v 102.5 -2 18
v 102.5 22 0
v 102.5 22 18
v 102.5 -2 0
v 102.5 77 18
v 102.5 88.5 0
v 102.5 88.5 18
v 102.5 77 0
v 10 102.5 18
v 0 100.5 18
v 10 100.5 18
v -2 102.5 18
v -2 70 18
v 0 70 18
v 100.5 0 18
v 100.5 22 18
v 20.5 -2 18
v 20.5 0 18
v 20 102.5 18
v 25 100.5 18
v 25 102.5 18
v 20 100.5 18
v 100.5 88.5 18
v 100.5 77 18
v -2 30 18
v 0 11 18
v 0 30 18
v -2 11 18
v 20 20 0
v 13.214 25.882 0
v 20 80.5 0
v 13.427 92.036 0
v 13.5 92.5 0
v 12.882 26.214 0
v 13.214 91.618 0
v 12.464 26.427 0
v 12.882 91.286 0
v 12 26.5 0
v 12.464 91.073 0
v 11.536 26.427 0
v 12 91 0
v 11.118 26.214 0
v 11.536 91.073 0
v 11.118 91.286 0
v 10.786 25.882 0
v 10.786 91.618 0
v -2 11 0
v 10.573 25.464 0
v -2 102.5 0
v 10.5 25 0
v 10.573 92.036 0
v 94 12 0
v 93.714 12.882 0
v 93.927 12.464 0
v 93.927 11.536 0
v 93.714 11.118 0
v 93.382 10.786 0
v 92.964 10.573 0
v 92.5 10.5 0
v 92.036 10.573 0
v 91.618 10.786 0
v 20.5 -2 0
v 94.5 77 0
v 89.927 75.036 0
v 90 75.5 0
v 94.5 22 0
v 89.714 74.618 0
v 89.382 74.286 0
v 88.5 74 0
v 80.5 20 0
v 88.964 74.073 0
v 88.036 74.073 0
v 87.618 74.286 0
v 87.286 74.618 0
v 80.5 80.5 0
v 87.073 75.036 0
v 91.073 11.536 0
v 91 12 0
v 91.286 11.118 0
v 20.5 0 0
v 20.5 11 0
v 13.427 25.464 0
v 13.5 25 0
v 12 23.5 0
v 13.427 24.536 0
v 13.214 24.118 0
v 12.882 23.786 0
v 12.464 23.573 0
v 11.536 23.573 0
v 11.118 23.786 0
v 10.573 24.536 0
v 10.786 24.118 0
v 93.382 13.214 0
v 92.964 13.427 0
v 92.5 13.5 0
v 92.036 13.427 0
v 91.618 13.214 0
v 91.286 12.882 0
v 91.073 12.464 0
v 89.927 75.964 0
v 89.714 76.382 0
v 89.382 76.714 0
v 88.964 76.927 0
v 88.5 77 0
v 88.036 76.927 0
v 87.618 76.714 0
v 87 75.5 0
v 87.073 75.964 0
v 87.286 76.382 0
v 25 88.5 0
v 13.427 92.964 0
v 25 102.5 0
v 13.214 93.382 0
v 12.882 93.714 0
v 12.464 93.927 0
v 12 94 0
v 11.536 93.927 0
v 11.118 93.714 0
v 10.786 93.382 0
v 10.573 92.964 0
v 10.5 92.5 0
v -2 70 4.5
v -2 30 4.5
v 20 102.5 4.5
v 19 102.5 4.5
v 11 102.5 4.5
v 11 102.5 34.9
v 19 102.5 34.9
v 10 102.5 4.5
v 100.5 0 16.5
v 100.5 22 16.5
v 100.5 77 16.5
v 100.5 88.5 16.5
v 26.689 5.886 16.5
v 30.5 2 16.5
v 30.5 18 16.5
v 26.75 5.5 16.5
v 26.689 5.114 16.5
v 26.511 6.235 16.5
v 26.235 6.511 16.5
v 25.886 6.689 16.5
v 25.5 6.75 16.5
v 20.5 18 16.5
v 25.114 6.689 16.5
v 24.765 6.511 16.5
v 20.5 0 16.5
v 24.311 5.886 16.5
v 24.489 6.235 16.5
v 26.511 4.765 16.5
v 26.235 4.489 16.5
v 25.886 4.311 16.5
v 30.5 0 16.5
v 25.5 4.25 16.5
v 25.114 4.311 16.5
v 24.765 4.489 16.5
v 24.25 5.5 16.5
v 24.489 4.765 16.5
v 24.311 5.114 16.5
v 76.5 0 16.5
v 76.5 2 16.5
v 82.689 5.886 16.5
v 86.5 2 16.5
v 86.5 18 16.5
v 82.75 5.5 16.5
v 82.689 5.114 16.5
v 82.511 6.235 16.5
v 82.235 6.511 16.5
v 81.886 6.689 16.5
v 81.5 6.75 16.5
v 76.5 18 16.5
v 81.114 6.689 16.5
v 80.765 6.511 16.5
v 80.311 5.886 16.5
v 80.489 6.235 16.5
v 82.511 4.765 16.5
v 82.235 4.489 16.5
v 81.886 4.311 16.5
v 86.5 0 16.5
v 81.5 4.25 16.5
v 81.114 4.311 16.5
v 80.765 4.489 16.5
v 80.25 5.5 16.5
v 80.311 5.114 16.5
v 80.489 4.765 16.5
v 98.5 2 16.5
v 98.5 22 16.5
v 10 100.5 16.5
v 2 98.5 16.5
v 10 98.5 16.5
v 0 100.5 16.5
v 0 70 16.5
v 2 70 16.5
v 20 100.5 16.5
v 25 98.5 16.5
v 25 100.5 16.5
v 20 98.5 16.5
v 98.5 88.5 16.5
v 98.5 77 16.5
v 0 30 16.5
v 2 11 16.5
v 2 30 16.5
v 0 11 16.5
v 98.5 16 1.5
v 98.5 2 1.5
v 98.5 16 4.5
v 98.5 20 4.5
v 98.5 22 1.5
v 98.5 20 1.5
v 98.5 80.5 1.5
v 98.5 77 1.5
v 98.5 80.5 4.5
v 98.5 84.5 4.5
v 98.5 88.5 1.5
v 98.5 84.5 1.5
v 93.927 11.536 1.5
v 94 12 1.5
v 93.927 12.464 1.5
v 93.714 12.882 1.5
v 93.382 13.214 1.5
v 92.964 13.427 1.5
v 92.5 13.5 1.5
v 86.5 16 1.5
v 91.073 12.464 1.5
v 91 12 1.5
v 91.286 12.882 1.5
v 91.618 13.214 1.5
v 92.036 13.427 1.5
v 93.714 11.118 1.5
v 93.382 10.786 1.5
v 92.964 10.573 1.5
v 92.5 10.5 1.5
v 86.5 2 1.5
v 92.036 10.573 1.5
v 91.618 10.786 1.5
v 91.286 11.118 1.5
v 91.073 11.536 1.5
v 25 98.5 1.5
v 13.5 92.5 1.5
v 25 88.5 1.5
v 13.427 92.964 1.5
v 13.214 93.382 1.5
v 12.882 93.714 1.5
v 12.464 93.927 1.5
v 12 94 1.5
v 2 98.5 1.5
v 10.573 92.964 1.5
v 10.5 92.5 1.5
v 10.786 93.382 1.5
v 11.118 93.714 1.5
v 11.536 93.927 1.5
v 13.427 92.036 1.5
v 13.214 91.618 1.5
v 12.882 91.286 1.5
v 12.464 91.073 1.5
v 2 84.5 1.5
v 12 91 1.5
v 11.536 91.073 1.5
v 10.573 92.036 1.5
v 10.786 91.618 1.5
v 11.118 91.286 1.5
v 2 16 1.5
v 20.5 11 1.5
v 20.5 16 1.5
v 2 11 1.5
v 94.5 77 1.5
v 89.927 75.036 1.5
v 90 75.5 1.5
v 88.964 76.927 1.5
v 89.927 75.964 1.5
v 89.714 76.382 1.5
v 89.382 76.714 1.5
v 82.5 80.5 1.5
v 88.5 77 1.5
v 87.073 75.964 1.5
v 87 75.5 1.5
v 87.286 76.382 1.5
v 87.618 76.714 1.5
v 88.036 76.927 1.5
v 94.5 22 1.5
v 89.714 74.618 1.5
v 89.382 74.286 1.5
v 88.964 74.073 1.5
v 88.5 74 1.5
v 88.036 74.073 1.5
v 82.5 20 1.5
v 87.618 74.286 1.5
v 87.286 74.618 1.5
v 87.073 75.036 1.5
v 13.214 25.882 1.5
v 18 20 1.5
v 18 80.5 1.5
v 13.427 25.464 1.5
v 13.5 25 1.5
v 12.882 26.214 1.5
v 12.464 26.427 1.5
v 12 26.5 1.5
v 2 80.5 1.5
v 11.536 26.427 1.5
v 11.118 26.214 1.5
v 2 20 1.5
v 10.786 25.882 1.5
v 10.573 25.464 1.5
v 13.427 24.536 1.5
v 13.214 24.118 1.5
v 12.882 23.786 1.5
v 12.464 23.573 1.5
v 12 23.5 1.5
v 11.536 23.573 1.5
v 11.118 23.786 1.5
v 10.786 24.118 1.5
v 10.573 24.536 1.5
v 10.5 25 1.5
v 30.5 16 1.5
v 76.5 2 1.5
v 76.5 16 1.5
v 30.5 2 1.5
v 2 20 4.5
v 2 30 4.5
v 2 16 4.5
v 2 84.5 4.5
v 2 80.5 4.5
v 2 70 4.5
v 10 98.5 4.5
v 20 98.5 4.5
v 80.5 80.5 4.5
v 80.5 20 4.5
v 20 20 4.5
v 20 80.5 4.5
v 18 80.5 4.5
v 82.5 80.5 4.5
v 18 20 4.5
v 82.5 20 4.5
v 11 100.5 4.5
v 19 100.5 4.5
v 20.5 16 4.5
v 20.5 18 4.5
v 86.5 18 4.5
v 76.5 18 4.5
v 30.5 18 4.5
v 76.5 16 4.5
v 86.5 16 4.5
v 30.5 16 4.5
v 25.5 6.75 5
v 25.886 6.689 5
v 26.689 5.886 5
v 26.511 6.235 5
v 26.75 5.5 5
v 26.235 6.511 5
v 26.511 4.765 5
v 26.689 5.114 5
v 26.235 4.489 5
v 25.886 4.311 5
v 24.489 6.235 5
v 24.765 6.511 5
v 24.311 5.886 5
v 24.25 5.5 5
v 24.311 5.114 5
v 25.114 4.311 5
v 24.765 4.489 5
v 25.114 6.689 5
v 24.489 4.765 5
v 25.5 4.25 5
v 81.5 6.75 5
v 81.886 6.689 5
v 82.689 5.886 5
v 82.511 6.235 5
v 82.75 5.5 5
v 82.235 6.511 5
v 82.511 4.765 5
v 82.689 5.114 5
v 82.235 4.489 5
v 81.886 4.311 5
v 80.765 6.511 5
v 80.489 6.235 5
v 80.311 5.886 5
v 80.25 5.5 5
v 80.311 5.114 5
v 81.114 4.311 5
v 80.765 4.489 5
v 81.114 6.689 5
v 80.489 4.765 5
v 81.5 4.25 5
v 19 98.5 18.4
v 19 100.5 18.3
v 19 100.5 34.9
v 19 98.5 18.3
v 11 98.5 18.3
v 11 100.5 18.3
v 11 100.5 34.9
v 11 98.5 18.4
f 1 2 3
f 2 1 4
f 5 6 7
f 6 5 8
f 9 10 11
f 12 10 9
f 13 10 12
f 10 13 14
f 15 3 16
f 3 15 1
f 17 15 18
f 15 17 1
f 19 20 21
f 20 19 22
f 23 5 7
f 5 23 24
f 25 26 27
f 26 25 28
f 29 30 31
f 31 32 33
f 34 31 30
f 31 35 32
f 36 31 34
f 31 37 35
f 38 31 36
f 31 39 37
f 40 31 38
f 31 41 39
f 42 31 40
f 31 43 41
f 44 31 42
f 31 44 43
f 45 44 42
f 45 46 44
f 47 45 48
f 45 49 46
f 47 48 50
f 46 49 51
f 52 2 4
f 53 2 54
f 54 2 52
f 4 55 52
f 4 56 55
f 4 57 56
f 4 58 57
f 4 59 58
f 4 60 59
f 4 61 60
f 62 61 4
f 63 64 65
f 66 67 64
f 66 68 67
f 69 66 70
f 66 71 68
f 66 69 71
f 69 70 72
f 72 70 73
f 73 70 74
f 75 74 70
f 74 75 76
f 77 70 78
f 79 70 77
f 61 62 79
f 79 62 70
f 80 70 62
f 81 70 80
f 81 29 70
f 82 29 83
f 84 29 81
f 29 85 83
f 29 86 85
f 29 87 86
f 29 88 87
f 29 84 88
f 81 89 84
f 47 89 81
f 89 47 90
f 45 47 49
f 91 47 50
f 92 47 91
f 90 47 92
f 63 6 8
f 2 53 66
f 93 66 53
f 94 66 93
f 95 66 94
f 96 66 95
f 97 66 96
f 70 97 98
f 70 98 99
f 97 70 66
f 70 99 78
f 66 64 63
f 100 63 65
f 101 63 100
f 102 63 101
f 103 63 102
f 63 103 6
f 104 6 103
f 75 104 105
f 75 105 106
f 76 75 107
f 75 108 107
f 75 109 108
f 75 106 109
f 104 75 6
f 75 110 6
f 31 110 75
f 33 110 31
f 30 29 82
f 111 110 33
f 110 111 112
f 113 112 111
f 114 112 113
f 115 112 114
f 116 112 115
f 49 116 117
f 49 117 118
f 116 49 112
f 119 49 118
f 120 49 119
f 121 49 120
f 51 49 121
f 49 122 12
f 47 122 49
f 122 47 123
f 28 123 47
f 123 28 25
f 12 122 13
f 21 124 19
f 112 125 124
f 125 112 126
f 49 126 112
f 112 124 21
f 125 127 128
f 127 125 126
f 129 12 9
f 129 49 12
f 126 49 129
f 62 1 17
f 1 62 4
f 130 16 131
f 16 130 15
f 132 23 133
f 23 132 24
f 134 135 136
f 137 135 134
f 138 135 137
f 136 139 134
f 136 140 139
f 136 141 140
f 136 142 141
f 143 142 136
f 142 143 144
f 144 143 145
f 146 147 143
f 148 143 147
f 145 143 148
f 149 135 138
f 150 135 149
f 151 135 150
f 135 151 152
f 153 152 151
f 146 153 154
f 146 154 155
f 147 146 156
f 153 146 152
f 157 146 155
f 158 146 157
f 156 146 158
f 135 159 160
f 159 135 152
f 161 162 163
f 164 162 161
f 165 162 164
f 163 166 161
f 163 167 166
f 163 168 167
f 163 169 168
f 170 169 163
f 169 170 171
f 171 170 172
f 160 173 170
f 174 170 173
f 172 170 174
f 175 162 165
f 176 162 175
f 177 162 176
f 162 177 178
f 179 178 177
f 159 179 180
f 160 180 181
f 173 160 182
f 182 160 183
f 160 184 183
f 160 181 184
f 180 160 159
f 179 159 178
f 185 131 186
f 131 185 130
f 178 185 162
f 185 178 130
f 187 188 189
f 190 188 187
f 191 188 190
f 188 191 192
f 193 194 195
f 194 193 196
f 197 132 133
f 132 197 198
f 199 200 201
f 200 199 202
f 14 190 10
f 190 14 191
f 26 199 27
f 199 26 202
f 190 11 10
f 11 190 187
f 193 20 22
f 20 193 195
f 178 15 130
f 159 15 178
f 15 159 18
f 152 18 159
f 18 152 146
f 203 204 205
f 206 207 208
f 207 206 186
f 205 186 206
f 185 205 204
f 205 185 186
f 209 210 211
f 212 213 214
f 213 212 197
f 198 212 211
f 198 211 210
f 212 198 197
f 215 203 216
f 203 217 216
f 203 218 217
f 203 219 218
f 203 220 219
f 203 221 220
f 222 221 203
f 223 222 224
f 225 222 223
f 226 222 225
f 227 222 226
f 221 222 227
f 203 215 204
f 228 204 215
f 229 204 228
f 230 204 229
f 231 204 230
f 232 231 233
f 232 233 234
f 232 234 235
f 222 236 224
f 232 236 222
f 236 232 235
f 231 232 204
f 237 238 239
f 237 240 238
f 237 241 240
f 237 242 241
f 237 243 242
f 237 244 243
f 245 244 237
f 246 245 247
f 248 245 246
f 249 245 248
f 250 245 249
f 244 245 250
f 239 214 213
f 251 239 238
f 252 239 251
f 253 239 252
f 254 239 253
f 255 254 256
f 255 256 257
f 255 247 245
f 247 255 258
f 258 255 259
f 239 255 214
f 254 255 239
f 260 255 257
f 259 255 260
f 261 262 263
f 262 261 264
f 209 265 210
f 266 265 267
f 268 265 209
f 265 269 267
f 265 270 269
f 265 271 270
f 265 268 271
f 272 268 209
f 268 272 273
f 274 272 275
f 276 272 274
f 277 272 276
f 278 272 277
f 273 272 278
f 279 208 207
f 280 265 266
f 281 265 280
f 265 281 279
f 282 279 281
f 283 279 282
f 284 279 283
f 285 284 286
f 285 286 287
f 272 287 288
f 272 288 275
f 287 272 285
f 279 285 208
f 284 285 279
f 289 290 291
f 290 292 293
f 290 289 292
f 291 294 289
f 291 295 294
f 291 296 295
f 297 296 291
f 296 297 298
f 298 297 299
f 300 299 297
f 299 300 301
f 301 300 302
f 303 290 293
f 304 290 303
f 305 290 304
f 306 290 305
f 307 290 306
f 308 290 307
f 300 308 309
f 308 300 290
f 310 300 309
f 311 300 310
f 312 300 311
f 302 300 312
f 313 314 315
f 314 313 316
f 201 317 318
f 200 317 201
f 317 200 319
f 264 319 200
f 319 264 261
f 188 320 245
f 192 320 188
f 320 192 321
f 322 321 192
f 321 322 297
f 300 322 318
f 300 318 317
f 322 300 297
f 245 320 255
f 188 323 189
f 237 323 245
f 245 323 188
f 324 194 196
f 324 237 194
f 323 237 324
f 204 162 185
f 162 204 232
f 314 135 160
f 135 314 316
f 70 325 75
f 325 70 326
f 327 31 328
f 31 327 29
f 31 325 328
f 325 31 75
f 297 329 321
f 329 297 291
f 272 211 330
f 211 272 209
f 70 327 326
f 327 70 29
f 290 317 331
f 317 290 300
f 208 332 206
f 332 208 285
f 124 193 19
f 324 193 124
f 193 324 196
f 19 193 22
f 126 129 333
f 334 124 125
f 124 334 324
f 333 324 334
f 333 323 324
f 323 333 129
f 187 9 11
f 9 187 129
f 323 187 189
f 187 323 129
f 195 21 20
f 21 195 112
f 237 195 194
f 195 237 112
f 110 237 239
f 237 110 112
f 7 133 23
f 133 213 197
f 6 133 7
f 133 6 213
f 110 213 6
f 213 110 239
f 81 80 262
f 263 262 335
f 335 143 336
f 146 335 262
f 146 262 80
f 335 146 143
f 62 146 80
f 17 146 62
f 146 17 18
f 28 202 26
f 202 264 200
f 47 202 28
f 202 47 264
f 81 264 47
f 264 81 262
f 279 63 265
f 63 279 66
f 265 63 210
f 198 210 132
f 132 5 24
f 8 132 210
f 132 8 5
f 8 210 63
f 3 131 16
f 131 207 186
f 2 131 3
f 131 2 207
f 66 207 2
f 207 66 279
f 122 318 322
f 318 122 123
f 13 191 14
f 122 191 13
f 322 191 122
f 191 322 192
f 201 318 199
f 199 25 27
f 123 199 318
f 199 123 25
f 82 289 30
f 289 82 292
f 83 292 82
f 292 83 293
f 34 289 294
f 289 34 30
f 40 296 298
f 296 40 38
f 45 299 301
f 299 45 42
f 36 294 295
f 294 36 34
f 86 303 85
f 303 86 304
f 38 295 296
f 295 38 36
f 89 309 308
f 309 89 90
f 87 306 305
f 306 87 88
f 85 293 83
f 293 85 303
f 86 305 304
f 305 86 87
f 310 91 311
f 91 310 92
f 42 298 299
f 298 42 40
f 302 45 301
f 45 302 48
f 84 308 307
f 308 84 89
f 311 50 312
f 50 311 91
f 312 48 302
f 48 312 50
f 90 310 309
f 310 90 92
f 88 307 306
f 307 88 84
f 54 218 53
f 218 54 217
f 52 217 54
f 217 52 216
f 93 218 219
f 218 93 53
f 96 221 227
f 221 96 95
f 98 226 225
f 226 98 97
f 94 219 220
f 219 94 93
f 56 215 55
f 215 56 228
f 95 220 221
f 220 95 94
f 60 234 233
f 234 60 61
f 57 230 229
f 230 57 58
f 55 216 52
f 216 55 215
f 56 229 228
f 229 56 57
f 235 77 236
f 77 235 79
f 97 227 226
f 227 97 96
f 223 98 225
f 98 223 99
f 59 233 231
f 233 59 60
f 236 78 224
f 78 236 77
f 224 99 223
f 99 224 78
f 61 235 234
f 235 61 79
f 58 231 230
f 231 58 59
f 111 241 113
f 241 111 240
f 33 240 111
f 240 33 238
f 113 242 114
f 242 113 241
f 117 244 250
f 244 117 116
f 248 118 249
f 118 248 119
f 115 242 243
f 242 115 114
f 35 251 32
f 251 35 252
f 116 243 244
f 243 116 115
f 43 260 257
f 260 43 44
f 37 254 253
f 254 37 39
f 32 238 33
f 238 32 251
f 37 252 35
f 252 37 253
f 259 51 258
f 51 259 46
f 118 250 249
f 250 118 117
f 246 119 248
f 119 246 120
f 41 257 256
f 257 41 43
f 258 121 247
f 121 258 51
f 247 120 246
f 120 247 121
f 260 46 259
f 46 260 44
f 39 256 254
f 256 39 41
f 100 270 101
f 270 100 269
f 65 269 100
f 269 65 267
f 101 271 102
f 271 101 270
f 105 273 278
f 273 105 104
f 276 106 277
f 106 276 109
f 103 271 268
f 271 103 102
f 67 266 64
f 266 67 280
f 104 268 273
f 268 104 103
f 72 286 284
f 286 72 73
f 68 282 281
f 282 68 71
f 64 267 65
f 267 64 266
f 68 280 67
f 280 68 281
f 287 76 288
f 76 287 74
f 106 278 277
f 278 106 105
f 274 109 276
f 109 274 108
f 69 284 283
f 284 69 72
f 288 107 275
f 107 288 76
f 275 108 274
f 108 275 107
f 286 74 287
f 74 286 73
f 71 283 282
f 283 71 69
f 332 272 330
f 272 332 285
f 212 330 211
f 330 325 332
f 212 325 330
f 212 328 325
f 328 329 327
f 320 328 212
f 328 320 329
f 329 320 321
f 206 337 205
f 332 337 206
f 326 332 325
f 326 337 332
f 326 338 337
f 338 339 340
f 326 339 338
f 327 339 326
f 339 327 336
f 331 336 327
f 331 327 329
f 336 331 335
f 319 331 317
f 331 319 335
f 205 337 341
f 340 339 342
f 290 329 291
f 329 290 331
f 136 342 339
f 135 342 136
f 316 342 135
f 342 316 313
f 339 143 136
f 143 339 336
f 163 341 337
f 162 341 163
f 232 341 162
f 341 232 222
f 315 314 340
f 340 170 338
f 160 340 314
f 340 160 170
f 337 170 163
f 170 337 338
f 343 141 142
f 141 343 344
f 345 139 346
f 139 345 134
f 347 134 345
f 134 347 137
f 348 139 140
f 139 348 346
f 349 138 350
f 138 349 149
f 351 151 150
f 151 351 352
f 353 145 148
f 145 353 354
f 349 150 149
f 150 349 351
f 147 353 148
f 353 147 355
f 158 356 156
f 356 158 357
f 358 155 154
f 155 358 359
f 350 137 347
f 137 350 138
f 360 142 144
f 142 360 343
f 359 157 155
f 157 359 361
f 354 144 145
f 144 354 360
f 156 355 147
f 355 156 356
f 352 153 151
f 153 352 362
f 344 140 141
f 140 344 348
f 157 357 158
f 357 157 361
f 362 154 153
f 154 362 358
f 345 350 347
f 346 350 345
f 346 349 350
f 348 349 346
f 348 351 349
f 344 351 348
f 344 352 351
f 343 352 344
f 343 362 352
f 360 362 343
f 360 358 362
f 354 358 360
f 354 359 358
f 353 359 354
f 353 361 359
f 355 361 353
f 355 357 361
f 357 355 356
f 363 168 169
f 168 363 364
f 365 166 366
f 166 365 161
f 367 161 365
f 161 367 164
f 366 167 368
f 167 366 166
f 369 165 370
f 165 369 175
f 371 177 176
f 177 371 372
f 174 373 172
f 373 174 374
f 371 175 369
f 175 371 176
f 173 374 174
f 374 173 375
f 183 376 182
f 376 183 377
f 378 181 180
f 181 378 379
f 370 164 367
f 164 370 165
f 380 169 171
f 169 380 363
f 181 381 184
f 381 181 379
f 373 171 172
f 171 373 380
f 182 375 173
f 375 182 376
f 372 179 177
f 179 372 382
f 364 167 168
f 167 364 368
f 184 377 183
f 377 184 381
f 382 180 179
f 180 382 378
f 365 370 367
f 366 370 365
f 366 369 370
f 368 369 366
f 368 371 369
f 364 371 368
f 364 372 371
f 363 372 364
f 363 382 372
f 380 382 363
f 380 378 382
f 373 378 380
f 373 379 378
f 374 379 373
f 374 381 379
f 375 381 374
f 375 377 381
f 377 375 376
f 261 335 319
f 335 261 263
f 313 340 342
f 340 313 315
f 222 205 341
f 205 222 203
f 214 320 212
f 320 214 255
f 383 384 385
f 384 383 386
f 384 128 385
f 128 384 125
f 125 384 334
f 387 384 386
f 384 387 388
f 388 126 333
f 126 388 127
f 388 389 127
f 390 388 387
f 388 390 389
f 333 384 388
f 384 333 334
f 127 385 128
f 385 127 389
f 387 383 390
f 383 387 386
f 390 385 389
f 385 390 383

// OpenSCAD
// Positionnement des trous du pcb
trou_dia=2.5;
trou_dis_g=25;
trou_dis=56;
trou_dis_d=19;
trou_dis_b=5.5;

trou_fixation=3;

bord=2;
fond=1.5;

h=16.5;
pcb_l=100.5;
pcb_L=100.5;
pcb_e=1.5;

languette=10;

support_l=10;
support_L=18;
support_trou=2.5;

difference(){
    union(){
      translate([-bord,-bord,0])cube([pcb_L+2*bord,pcb_L+2*bord,h+pcb_e]);
    }
    
    // evidement PCB
    translate([0,0,h])cube([pcb_L,pcb_L,2*h]);
    
    // evidement interieur
    translate([bord,bord,fond])cube([pcb_L-2*bord,pcb_L-2*bord,2*h]);
    translate([10*bord,10*bord,-1])cube([pcb_L-20*bord,pcb_L-20*bord,2*h]);
    
    // Evidement languette
    translate([10,pcb_L-5*bord,3*fond])cube([languette,10*bord,2*h]);
    
    // Evidement relais
    translate([10+languette+5,pcb_L-12,-1])cube([pcb_l,10*bord,2*h]);
    
    // Evidement rtc
    translate([-2*bord,-2*bord,-1])cube([24.5,15,2*h]);
    
    // Evidement secteur
    translate([pcb_l-10+2*bord,22,-1])cube([10,55,2*h]);
    
    // Evidement nano
    translate([-2*bord,30,3*fond])cube([10,40,2*h]);
    
    // trous de fixation
    translate([12,25,-fond])cylinder(d=trou_fixation, h=3*fond,$fn=20);
    translate([pcb_L-8,12,-fond])cylinder(d=trou_fixation, h=3*fond,$fn=20);
    translate([12,pcb_L-8,-fond])cylinder(d=trou_fixation, h=3*fond,$fn=20);
    translate([pcb_L-12,pcb_L-25,-fond])cylinder(d=trou_fixation, h=3*fond,$fn=20);
    
}

// Renford carré au fond
difference(){
      translate([9*bord,9*bord,0])cube([pcb_L-18*bord,pcb_L-18*bord,3*fond]);
    translate([10*bord,10*bord,-1])cube([pcb_L-20*bord,pcb_L-20*bord,2*h]);
}

// Renfords transverse
translate([0,8*bord,0]) cube([pcb_l,2*bord,3*fond]);
translate([0,10*bord+pcb_L-20*bord,0]) cube([pcb_l,2*bord,3*fond]);

// Support a visser
translate([trou_dis_g-5+0.5,0,0]) difference(){
  // Bloc sous les vis  
  union(){
    cube([support_l,support_L,h]);
    translate([trou_dis,0,0])cube([support_l,support_L,h]);
  }
  // T vis  
  translate([support_l/2,trou_dis_b,5])cylinder(d=support_trou,h=h,$fn=20);
  translate([trou_dis+support_l/2,trou_dis_b,5])cylinder(d=support_trou,h=h,$fn=20);
}

// Languette
translate([11,pcb_L,0])cube([languette-2,bord,pcb_e+h+0.3]);
hull(){
  translate([11,pcb_L-bord,pcb_e+h+0.3])cube([languette-2,2*bord,0.1]);
  translate([11,pcb_L,pcb_e+h+0.3+h])cube([languette-2,bord,0.1]);
}
